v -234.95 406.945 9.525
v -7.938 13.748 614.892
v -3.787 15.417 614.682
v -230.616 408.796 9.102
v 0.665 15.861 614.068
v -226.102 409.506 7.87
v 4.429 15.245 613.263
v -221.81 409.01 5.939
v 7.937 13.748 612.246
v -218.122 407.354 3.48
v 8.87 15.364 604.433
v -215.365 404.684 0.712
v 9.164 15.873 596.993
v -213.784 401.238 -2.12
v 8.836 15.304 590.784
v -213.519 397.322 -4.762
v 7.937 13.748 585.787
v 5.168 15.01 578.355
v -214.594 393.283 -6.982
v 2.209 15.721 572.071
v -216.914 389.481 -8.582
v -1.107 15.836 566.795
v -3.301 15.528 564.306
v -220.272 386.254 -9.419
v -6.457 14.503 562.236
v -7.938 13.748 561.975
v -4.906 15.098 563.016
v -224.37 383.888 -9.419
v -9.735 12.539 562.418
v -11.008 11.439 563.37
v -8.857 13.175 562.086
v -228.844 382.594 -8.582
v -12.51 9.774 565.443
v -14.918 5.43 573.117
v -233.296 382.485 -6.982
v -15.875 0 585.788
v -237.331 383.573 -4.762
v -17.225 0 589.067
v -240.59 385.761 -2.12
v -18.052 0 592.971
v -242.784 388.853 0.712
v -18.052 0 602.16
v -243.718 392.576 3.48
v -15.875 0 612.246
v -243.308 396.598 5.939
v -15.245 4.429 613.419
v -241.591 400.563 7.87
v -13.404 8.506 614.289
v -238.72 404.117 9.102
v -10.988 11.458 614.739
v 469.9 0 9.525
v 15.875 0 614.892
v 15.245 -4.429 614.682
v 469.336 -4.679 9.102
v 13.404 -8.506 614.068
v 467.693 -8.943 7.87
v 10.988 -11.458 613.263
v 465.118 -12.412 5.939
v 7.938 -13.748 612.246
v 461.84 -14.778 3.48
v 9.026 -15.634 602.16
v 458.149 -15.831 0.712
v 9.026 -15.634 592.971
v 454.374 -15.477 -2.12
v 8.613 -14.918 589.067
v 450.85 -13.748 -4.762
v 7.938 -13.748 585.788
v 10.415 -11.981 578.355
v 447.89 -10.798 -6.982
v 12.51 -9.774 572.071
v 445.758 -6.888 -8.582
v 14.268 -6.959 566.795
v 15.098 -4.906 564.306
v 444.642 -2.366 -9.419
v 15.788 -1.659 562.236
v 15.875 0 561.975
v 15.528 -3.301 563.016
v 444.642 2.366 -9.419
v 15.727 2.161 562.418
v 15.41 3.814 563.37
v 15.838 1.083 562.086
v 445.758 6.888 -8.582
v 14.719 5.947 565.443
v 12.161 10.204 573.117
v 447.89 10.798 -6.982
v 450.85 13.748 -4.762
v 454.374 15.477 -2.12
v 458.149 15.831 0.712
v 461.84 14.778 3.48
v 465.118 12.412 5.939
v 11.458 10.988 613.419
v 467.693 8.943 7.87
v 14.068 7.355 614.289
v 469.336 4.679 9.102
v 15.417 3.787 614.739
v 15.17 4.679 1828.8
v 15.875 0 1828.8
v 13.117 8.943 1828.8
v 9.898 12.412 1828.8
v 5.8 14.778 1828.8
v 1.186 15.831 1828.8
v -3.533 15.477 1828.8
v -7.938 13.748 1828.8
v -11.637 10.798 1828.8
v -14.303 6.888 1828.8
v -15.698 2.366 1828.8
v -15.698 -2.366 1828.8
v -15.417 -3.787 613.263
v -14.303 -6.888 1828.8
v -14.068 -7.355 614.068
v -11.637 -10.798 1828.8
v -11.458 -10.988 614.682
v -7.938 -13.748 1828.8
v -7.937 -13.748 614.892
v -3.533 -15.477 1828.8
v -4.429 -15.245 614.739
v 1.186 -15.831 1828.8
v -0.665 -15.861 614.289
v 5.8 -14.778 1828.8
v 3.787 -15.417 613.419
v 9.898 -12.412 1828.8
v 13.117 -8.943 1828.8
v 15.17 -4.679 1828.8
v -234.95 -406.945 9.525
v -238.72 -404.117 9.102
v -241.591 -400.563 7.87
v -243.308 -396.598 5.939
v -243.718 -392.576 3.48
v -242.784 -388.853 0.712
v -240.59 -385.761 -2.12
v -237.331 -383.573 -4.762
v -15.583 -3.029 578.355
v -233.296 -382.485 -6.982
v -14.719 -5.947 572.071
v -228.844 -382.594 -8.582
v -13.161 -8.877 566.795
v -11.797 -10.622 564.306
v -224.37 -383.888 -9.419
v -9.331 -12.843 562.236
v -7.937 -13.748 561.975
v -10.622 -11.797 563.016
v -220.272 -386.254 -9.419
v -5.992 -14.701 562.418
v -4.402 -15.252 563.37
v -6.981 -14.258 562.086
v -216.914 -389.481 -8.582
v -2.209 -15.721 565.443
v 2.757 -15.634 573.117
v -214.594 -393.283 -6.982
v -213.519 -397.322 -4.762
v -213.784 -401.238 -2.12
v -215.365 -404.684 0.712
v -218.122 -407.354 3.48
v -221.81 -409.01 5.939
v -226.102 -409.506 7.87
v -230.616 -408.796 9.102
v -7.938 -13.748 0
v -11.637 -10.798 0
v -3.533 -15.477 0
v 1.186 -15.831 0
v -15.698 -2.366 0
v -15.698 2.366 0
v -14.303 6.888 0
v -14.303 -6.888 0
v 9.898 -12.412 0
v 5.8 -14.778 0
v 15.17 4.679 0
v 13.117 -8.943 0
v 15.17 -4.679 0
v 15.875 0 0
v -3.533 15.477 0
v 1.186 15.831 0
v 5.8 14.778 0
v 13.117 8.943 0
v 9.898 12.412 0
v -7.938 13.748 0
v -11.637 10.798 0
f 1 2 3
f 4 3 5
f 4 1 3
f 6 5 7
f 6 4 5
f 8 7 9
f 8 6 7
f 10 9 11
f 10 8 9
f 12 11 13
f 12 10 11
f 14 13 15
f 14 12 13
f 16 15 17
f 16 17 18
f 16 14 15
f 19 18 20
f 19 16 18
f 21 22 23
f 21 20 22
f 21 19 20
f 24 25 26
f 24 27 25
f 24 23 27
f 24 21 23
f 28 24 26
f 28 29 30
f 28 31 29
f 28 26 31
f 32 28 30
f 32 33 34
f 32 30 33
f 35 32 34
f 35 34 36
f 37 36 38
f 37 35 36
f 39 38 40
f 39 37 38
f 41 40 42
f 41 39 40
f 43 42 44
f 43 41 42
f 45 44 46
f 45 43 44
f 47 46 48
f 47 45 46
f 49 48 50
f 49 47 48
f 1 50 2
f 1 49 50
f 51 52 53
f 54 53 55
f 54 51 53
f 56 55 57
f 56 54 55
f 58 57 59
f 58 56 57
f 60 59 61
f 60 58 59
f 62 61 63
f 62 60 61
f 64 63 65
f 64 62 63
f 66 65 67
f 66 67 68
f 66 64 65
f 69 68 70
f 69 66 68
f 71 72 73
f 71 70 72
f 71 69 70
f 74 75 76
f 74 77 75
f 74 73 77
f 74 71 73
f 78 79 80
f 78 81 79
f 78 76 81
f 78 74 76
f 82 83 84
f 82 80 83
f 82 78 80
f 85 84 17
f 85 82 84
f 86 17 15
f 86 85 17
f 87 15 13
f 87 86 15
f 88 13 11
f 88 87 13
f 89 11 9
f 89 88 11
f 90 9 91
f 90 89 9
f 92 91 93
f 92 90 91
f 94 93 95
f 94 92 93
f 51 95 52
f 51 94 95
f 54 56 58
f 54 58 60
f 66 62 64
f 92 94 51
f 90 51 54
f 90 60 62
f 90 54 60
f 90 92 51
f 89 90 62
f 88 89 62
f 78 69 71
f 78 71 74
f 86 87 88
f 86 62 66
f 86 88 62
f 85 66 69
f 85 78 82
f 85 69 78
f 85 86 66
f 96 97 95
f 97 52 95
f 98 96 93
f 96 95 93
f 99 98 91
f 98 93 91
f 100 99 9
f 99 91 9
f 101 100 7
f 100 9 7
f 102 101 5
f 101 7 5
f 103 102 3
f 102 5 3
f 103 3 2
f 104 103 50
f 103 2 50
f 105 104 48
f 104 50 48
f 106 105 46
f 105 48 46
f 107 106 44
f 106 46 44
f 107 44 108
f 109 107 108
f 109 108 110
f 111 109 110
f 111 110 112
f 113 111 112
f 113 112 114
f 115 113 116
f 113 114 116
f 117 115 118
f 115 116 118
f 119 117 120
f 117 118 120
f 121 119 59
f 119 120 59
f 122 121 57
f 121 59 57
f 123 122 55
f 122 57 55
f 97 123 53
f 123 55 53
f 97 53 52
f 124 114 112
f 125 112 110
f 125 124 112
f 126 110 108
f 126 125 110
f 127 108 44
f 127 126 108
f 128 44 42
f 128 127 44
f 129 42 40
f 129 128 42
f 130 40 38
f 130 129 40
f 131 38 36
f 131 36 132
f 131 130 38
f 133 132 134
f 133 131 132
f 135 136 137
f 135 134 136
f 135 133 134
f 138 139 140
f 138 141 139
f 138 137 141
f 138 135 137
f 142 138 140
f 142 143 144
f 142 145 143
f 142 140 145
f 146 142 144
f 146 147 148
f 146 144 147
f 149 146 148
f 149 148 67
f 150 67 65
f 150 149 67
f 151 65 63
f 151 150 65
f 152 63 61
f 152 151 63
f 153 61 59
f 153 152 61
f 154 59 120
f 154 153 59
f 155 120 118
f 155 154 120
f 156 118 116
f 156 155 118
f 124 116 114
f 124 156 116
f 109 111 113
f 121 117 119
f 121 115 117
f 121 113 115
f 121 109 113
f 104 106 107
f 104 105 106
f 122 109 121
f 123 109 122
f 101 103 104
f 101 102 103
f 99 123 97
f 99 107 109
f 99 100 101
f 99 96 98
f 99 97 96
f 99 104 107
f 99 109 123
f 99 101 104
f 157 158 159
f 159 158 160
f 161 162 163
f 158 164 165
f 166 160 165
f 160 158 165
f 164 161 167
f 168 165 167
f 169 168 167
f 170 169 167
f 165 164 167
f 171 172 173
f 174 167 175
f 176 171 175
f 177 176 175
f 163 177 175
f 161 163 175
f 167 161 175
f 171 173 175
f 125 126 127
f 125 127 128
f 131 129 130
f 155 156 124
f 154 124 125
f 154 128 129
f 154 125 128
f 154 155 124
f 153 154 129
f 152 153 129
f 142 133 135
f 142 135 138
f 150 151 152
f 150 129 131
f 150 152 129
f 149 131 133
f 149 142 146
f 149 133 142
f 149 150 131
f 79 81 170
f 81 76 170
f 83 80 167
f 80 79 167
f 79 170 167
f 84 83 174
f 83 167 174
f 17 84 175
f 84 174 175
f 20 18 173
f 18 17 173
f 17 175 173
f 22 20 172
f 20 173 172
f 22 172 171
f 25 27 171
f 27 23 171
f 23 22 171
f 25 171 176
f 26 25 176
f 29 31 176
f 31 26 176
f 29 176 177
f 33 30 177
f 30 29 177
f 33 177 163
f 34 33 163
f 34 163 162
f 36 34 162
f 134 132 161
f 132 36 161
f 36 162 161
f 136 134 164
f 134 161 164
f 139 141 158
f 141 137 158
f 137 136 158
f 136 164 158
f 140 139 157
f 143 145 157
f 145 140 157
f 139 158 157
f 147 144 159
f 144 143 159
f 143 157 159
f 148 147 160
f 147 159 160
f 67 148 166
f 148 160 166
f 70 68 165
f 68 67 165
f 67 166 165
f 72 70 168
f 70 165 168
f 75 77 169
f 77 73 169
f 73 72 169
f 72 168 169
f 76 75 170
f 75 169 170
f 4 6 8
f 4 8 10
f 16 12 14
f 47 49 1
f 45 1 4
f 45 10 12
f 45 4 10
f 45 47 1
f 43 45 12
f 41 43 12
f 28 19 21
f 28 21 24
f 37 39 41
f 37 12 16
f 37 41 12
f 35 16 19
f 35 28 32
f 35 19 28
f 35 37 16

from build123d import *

# Parameters (mm, degrees)
F0_R     = 15.875
F1_DEPTH = 1828.8
F4_R     = 15.875
F6_COUNT = 3


with BuildPart() as f1:
    # F0 (on Top) → F1 (new body)
    with BuildSketch(Plane.XY):
        Circle(F0_R)
    extrude(amount=F1_DEPTH)

    # F5: sweep along a path in F2
    with BuildLine(Plane.XZ) as f5_path:
        Line((0, 609.6), (457.2, 0))
    # F4 (on face) → F5 (sweep)
    with BuildSketch(Plane(origin=(164.592, 0, -219.456), x_dir=(0.8, 0, 0.6), z_dir=(0.6, 0, -0.8))):
        with Locations((365.76, 0)):
            Circle(F4_R)
    sweep(path=f5_path.line)

    # F6: F1 ×3 about axis
    f6_axis = Axis((0, 0, 0), (0, 0, -1))


with BuildPart() as f1_1:
    add(f1.part)
    for i in range(1, F6_COUNT):
        add(f1.part.rotate(f6_axis, i * 360 / F6_COUNT))


solid = f1_1.part
